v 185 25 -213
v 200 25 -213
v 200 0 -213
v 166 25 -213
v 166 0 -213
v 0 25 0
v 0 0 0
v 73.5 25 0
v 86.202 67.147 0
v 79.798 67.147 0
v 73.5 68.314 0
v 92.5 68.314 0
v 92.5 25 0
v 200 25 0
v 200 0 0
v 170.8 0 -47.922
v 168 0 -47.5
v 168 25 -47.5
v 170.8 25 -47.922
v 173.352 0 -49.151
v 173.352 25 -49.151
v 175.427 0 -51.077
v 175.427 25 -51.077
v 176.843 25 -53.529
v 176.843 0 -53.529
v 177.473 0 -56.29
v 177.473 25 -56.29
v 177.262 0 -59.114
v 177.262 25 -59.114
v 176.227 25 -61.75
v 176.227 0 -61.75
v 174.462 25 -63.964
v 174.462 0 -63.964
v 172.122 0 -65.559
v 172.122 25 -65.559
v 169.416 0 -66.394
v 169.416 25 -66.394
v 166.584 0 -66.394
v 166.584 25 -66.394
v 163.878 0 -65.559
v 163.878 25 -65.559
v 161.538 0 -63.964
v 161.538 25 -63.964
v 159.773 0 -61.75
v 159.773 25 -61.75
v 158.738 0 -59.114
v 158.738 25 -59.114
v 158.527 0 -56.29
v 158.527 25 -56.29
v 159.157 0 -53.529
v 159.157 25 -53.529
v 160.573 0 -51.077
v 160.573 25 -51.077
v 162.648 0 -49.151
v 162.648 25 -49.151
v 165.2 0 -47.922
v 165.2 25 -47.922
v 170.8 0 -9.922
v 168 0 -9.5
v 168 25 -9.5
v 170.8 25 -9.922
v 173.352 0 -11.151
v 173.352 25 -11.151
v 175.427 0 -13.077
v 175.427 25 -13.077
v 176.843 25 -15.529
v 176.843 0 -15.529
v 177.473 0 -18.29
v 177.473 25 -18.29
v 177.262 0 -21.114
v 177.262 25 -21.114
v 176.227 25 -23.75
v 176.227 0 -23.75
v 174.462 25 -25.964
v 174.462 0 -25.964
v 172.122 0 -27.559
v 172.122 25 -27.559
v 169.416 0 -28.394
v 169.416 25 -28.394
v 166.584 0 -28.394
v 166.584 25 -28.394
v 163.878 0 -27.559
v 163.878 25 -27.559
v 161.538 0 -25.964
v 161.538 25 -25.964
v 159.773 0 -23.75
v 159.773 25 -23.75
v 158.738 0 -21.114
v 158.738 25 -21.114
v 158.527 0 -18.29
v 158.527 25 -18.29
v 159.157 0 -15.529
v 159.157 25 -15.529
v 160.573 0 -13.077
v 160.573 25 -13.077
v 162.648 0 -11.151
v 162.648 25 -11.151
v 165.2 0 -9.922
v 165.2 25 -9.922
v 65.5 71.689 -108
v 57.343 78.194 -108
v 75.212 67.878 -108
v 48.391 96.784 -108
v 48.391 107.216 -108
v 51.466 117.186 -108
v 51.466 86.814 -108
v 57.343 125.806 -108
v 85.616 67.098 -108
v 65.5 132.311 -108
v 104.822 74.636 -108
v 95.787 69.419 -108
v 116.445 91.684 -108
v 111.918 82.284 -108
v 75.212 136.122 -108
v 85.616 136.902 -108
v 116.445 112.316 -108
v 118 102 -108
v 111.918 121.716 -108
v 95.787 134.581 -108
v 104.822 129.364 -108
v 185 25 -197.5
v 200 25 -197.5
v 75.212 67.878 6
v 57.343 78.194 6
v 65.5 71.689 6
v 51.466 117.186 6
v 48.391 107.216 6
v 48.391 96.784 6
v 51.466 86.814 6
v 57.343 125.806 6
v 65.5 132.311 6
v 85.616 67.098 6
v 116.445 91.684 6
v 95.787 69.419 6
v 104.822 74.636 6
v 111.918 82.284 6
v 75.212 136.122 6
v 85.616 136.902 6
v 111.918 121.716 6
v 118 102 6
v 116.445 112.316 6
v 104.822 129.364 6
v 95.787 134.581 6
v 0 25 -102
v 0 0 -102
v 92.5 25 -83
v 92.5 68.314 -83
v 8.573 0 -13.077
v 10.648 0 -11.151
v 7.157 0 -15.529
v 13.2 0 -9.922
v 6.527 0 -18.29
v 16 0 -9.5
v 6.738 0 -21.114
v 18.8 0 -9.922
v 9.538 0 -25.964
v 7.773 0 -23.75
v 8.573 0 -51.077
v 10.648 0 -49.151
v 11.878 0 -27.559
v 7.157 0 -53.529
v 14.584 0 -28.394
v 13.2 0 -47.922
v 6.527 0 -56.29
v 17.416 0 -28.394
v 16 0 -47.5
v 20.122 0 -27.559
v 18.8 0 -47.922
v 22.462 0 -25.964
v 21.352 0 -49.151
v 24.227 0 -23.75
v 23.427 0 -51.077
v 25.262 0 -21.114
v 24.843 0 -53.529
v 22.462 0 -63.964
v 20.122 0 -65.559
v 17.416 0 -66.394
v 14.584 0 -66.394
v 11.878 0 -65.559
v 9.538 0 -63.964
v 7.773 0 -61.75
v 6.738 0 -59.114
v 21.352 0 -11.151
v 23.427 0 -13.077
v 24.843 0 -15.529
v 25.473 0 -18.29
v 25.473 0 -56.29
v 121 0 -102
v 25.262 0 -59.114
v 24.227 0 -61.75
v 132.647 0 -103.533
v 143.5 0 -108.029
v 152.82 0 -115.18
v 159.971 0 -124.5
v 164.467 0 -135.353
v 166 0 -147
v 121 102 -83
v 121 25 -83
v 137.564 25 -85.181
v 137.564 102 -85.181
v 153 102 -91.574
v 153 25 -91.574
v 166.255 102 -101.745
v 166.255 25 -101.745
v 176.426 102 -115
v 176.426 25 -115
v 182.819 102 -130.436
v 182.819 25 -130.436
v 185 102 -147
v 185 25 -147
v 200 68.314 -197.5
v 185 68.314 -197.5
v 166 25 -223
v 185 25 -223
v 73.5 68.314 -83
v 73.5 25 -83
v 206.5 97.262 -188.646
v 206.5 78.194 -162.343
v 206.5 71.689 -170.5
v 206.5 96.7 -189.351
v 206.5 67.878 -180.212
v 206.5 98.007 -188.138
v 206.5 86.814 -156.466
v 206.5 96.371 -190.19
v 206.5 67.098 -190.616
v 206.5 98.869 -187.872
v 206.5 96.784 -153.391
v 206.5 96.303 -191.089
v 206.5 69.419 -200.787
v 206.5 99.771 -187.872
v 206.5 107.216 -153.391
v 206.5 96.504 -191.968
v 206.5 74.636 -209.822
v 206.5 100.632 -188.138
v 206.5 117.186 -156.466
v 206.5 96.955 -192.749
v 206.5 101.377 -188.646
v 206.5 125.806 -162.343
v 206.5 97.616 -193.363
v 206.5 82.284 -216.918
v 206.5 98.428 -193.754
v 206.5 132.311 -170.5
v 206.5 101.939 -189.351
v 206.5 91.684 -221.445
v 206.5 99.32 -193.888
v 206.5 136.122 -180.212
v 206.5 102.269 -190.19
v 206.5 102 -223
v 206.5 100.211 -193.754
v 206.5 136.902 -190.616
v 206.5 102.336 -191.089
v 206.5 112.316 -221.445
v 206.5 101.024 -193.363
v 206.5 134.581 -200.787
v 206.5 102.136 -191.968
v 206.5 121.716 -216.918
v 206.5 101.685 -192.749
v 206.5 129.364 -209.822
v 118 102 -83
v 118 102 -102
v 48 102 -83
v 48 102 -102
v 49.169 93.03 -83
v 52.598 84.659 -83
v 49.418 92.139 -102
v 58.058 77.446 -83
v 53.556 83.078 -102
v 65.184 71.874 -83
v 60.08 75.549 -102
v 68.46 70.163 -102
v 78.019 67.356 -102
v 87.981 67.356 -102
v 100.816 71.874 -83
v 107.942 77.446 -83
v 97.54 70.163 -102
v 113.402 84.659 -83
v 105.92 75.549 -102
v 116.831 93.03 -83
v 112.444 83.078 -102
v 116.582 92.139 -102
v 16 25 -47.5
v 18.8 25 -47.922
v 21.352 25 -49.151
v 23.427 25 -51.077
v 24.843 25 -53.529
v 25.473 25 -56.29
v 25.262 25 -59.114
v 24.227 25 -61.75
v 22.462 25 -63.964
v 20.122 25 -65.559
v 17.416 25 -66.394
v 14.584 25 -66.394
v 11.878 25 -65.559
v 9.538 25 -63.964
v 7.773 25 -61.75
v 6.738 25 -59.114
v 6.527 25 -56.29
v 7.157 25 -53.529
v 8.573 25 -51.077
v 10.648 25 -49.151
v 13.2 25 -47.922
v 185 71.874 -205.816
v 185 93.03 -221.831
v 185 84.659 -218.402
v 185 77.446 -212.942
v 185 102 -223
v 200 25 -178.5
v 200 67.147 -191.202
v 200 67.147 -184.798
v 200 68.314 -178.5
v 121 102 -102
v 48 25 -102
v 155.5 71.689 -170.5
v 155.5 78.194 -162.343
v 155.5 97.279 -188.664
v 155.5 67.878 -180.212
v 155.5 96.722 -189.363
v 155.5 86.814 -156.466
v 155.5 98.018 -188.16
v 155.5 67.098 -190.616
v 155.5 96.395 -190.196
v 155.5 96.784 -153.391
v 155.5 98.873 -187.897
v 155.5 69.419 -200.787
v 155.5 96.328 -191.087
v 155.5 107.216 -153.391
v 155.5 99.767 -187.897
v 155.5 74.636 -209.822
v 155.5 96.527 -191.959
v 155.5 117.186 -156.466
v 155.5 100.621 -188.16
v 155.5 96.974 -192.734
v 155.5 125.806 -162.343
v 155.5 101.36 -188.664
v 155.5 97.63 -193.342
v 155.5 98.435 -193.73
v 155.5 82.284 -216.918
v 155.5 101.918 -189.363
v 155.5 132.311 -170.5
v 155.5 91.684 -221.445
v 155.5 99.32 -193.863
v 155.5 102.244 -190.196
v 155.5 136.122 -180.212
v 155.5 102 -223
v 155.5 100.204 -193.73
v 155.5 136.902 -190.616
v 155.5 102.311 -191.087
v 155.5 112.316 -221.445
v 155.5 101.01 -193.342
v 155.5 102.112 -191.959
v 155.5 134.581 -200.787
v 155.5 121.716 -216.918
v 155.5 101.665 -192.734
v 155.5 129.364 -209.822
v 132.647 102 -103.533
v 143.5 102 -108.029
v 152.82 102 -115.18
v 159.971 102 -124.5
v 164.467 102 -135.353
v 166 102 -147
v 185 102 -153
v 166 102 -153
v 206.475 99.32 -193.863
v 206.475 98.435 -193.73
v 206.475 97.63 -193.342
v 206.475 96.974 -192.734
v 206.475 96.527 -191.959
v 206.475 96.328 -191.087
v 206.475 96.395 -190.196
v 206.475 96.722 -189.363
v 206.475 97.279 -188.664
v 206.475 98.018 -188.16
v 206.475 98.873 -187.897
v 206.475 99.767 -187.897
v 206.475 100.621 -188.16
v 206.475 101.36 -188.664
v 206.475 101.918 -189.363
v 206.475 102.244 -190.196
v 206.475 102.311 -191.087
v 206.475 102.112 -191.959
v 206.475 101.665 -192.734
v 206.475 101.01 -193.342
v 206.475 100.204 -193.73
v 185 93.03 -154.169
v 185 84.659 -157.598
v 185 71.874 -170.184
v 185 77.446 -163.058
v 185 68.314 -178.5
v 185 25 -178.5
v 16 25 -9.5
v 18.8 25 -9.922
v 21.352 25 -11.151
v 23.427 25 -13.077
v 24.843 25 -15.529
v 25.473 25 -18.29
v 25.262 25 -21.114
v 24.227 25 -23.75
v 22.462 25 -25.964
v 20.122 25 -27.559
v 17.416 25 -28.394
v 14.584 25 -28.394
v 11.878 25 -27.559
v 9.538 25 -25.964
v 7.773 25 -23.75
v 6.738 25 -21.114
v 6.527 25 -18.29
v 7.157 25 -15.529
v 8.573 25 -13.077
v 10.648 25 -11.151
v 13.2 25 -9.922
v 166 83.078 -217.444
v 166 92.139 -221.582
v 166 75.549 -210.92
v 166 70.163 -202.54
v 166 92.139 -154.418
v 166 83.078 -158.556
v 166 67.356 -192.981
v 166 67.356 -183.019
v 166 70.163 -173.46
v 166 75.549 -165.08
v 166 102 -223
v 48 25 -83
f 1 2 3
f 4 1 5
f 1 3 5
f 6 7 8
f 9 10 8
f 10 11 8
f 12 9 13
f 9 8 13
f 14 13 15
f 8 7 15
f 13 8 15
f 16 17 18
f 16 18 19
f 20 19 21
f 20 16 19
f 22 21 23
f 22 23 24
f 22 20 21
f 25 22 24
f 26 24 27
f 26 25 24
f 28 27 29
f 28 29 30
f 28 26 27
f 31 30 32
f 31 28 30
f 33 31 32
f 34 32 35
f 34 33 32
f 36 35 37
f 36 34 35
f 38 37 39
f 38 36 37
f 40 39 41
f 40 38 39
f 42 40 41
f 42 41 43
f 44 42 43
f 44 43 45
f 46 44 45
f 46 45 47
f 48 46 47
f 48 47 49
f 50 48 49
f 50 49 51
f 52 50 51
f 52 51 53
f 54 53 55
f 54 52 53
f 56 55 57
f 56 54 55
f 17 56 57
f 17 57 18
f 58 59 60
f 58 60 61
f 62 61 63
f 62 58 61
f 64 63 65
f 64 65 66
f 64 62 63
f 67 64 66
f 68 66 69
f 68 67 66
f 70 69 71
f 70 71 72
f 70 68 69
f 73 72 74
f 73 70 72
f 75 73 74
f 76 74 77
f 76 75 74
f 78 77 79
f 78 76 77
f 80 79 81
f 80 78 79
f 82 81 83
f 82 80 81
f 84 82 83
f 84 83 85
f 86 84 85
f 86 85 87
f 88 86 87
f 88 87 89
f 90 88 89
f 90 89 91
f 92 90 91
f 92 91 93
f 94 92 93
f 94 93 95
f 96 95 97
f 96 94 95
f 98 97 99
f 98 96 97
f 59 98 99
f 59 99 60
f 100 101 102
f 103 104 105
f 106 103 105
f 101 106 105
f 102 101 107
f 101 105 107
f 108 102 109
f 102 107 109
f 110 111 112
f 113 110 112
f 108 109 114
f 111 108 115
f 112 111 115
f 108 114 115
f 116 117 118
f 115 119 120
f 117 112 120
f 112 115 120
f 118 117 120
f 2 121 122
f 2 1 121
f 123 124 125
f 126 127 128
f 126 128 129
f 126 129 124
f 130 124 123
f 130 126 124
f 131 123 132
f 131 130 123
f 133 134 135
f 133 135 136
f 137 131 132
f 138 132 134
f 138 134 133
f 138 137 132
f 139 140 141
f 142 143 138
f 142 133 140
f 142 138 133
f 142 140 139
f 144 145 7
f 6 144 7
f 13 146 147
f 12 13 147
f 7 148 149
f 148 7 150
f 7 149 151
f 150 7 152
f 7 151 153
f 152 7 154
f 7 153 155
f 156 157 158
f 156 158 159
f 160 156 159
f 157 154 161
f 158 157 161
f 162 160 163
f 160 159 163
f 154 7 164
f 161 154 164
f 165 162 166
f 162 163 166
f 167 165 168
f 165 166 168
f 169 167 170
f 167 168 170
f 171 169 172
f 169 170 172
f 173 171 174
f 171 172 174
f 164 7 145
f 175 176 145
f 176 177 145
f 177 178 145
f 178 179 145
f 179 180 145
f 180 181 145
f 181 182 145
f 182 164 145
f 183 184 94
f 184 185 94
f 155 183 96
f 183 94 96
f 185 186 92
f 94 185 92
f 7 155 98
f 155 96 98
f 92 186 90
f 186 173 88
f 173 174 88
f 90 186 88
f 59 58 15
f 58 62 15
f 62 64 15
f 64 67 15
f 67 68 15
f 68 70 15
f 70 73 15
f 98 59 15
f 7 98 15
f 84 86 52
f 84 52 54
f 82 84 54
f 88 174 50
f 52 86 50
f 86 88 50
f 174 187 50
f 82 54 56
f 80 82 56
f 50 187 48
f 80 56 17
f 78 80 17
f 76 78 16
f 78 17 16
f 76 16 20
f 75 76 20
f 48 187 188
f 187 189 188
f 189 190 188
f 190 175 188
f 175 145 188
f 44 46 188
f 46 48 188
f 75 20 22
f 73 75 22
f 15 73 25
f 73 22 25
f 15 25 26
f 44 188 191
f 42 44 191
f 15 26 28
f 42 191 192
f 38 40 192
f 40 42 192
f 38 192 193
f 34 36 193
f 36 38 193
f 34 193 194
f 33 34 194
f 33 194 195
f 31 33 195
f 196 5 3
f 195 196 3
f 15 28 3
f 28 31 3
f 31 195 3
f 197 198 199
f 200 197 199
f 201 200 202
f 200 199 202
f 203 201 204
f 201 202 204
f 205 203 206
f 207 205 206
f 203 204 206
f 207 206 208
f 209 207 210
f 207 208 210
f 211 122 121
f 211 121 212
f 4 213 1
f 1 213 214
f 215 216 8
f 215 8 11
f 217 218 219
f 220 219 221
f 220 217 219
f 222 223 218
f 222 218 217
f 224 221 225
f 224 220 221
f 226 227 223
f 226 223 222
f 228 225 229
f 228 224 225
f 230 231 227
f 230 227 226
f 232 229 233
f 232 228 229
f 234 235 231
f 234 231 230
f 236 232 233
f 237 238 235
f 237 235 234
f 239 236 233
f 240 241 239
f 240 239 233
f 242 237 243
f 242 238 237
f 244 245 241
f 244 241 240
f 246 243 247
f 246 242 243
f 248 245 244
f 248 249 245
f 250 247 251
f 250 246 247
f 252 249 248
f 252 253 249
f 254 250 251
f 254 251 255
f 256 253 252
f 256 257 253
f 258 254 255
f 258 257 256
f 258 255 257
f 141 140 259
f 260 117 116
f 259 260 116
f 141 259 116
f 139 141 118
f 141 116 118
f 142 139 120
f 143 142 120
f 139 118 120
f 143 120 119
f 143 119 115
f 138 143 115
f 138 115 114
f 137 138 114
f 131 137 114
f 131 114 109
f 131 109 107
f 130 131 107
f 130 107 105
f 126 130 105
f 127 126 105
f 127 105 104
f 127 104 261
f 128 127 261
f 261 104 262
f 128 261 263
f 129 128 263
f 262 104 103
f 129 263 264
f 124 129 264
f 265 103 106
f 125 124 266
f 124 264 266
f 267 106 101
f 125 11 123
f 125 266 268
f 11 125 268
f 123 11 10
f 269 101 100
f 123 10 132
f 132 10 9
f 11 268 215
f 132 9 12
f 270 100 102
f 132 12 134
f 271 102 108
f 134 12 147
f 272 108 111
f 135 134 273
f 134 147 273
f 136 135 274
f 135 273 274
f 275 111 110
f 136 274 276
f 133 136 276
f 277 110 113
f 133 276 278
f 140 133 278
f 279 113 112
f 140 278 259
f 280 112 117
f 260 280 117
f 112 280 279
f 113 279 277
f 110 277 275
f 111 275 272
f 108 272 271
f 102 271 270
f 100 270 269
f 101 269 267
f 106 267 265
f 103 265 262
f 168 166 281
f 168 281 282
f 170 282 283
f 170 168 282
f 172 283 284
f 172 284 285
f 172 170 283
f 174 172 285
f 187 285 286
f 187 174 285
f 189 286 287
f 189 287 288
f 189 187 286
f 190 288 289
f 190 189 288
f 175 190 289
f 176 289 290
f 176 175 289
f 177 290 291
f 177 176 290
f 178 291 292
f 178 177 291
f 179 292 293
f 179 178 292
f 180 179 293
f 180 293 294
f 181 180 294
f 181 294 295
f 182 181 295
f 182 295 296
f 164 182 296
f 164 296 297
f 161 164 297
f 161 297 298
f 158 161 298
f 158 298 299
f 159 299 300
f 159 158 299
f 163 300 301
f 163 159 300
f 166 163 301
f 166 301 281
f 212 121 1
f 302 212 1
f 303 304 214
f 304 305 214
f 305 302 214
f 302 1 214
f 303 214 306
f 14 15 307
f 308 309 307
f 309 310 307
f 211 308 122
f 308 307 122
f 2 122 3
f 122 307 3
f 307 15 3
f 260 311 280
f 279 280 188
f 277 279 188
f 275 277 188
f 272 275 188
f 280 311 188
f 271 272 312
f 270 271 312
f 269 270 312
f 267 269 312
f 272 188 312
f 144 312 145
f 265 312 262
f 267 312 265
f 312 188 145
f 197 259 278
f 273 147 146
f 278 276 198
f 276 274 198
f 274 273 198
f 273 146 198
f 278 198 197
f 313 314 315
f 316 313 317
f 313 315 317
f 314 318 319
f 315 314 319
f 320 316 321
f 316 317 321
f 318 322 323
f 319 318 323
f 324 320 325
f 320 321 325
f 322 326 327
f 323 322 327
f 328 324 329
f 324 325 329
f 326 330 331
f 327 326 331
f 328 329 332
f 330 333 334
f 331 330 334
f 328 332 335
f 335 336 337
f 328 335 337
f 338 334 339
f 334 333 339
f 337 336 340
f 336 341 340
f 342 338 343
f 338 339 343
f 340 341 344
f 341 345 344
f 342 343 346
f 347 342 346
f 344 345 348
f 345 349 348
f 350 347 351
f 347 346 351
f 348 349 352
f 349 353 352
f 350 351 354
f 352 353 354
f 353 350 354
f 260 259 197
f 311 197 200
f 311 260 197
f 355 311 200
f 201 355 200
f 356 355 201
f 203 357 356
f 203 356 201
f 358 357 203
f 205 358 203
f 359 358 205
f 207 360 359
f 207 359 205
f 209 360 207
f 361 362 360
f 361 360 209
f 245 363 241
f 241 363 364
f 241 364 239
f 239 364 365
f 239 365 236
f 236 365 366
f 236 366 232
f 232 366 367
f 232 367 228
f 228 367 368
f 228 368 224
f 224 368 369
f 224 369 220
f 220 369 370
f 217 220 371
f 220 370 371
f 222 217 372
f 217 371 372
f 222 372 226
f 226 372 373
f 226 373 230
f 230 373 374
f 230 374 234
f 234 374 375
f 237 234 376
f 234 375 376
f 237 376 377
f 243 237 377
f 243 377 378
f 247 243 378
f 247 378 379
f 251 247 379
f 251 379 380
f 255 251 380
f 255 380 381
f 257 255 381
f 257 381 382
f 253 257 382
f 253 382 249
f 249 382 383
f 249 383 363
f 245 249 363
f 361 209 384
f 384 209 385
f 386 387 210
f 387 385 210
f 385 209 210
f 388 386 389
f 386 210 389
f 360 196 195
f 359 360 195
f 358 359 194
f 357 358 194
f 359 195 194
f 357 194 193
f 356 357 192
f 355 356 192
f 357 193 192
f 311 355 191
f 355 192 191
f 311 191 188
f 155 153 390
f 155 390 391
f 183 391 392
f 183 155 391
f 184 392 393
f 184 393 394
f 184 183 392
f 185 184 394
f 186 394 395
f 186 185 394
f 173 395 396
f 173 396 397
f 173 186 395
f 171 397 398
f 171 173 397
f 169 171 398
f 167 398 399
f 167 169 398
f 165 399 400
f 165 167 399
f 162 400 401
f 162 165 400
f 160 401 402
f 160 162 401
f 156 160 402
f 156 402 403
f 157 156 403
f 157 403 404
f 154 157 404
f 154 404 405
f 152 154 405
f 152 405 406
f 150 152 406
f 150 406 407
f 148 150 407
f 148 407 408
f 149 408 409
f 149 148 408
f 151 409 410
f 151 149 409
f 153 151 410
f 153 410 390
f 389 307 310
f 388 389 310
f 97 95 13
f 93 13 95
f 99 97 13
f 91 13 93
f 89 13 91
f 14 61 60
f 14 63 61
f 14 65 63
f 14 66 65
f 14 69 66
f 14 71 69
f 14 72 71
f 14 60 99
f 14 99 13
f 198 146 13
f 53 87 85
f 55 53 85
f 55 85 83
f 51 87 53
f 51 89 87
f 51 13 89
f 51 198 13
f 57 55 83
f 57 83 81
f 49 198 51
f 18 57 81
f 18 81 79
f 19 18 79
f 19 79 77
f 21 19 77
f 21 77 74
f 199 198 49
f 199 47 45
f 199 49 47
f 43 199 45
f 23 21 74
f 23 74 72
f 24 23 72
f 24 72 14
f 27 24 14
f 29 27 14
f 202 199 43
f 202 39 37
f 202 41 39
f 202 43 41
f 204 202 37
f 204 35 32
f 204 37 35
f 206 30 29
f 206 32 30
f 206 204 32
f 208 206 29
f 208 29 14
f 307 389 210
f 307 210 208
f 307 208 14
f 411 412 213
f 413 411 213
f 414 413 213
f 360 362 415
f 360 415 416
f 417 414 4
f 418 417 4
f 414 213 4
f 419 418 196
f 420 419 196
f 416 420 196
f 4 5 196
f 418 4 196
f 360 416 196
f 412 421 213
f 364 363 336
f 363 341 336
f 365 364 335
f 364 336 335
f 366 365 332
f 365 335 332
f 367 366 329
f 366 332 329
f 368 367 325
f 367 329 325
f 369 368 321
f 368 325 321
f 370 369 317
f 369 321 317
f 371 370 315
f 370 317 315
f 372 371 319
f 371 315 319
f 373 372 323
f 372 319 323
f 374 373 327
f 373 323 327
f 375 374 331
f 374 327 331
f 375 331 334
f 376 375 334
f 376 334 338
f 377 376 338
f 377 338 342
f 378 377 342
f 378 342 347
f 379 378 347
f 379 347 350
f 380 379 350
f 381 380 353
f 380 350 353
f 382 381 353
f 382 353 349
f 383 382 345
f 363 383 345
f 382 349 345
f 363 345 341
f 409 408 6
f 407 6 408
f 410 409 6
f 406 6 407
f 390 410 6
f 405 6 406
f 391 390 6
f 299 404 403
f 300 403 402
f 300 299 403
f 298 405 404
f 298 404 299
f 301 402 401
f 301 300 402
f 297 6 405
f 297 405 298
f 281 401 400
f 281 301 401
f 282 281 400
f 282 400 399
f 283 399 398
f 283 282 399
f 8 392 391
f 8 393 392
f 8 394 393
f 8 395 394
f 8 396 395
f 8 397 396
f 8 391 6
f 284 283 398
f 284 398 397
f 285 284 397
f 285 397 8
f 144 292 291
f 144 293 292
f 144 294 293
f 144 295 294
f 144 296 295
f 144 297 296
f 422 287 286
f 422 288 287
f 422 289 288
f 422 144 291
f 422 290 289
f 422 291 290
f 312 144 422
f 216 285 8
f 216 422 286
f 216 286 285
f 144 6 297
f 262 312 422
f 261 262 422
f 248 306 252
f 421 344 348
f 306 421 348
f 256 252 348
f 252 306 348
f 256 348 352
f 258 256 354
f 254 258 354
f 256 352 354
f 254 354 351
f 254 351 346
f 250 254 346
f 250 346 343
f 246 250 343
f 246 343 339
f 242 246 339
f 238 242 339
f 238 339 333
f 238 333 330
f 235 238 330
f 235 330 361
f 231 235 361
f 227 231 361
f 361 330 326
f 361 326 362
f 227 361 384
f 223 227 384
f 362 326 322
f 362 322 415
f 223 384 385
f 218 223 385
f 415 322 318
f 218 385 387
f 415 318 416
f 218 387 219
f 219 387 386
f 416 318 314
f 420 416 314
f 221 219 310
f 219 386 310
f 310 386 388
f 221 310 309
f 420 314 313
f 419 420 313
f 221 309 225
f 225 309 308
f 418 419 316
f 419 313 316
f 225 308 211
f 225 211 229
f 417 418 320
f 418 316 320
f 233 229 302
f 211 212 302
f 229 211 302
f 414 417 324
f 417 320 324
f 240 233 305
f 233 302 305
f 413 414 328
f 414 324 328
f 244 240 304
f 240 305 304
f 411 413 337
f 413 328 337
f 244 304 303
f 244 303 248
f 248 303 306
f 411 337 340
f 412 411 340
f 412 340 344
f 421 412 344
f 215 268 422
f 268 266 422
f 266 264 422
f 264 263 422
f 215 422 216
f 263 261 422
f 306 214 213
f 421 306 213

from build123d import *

# Parameters (mm, degrees)
SKETCH1_R                       = 9.5
BOSS_EXTRUDE1_DEPTH             = 25
BOSS_EXTRUDE2_DEPTH             = 6
BOSS_EXTRUDE2_DEPTH_BACK        = 108
SKETCH2_R                       = 35
BOSS_EXTRUDE3_DEPTH             = 6.5
BOSS_EXTRUDE3_DEPTH_BACK        = 44.5
SKETCH3_R                       = 35
BOSS_EXTRUDE4_DEPTH             = 77
RIB1_REACH                      = 331.39
SKETCH5_WALLS_W                 = 19
SKETCH5_WALLS_H                 = 685.704980613
RIB2_REACH                      = 335.377
SKETCH6_WALLS_W                 = 19
SKETCH6_WALLS_H                 = 696.792690098
F_6_0MM_DOWEL_HOLE1_D           = 6
F_6_0MM_DOWEL_HOLE1_DEPTH       = 54
F_6_0MM_DOWEL_HOLE1_CSINK_D     = 6.05
F_6_0MM_DOWEL_HOLE1_CSINK_ANGLE = 90
F_6_0MM_DOWEL_HOLE1_TIP         = 1.802581857


with BuildPart() as part:
    # Sketch1 → Boss-Extrude1 (new body)
    with BuildSketch(Plane(origin=(0, 0, 0), x_dir=(1, 0, 0), z_dir=(0, 1, 0))):
        with BuildLine():
            Line((0, 102), (0, 0))
            Line((0, 0), (200, 0))
            Line((200, 0), (200, 213))
            Line((200, 213), (166, 213))
            Line((166, 213), (166, 147))
            ThreePointArc((166, 147), (152.819805153, 115.180194847), (121, 102))
            Line((121, 102), (0, 102))
        make_face()
        with Locations(Location((16, 57, 0), (0, 0, 270))):
            Circle(SKETCH1_R, mode=Mode.SUBTRACT)
        with Locations(Location((16, 19, 0), (0, 0, 270))):
            Circle(SKETCH1_R, mode=Mode.SUBTRACT)
        with Locations(Location((168, 19, 0), (0, 0, 270))):
            Circle(SKETCH1_R, mode=Mode.SUBTRACT)
        with Locations(Location((168, 57, 0), (0, 0, 270))):
            Circle(SKETCH1_R, mode=Mode.SUBTRACT)
    extrude(amount=BOSS_EXTRUDE1_DEPTH)



with BuildPart() as body_2:
    # Sketch2 → Boss-Extrude2 (new, two sides: drawn at the far end of the back side and taken through both)
    with BuildSketch(Plane.XY.offset(-BOSS_EXTRUDE2_DEPTH_BACK)):
        with Locations((83, 102)):
            Circle(SKETCH2_R)
    extrude(amount=BOSS_EXTRUDE2_DEPTH + BOSS_EXTRUDE2_DEPTH_BACK)


with BuildPart() as body_3:
    # Sketch3 → Boss-Extrude3 (new, two sides: drawn at the far end of the back side and taken through both)
    with BuildSketch(Plane(origin=(200, 0, 0), x_dir=(0, 0, -1), z_dir=(1, 0, 0)).offset(-BOSS_EXTRUDE3_DEPTH_BACK)):
        with Locations((188, 102)):
            Circle(SKETCH3_R)
    extrude(amount=BOSS_EXTRUDE3_DEPTH + BOSS_EXTRUDE3_DEPTH_BACK)


with BuildPart() as part_1:
    add(part.part)

    add(body_2.part)  # Boss-Extrude4 merges body 2

    add(body_3.part)  # Boss-Extrude4 merges body 3
    # Sketch4 → Boss-Extrude4 (add)
    with BuildSketch(Plane(origin=(0, 25, 0), x_dir=(1, 0, 0), z_dir=(0, 1, 0))):
        with BuildLine():
            Line((121, 102), (48, 102))
            Line((48, 102), (48, 83))
            Line((48, 83), (121, 83))
            ThreePointArc((121, 83), (166.254833996, 101.745166004), (185, 147))
            Line((185, 147), (185, 223))
            Line((185, 223), (166, 223))
            Line((166, 223), (166, 147))
            ThreePointArc((166, 147), (152.819805153, 115.180194847), (121, 102))
        make_face()
    extrude(amount=BOSS_EXTRUDE4_DEPTH)

    # Sketch5 walls → Rib1 (add, up to next)
    with BuildSketch(Plane(origin=(200, 0, 0), x_dir=(0, 0, -1), z_dir=(1, 0, 0)), mode=Mode.PRIVATE) as rib1_sk1:
        with Locations((188, 47.27733831)):
            Rectangle(SKETCH5_WALLS_W, SKETCH5_WALLS_H)
    rib1_tool1 = extrude(rib1_sk1.sketch, amount=-RIB1_REACH, mode=Mode.PRIVATE) - part_1.part
    add(rib1_tool1.solids().sort_by_distance((200, 47.277338311, -188))[0])

    # Sketch6 walls → Rib2 (add, up to next)
    with BuildSketch(Plane.XY, mode=Mode.PRIVATE) as rib2_sk1:
        with Locations((83, 44.133110569)):
            Rectangle(SKETCH6_WALLS_W, SKETCH6_WALLS_H)
    rib2_tool1 = extrude(rib2_sk1.sketch, amount=-RIB2_REACH, mode=Mode.PRIVATE) - part_1.part
    add(rib2_tool1.solids().sort_by_distance((83, 44.133110569, 0))[0])

    # Ø6.0mm Dowel Hole1
    with Locations(Plane(origin=(206.5, 99.319699539, -190.863289795), x_dir=(0, 0, 1), z_dir=(1, 0, 0))):
        with Locations((0, 0)):
            CounterSinkHole(F_6_0MM_DOWEL_HOLE1_D / 2, F_6_0MM_DOWEL_HOLE1_CSINK_D / 2, depth=F_6_0MM_DOWEL_HOLE1_DEPTH, counter_sink_angle=F_6_0MM_DOWEL_HOLE1_CSINK_ANGLE)
            with Locations((0, 0, -(F_6_0MM_DOWEL_HOLE1_DEPTH + F_6_0MM_DOWEL_HOLE1_TIP / 2))):  # 118° drill point
                Cone(0, F_6_0MM_DOWEL_HOLE1_D / 2, F_6_0MM_DOWEL_HOLE1_TIP, mode=Mode.SUBTRACT)


solid = part_1.part
